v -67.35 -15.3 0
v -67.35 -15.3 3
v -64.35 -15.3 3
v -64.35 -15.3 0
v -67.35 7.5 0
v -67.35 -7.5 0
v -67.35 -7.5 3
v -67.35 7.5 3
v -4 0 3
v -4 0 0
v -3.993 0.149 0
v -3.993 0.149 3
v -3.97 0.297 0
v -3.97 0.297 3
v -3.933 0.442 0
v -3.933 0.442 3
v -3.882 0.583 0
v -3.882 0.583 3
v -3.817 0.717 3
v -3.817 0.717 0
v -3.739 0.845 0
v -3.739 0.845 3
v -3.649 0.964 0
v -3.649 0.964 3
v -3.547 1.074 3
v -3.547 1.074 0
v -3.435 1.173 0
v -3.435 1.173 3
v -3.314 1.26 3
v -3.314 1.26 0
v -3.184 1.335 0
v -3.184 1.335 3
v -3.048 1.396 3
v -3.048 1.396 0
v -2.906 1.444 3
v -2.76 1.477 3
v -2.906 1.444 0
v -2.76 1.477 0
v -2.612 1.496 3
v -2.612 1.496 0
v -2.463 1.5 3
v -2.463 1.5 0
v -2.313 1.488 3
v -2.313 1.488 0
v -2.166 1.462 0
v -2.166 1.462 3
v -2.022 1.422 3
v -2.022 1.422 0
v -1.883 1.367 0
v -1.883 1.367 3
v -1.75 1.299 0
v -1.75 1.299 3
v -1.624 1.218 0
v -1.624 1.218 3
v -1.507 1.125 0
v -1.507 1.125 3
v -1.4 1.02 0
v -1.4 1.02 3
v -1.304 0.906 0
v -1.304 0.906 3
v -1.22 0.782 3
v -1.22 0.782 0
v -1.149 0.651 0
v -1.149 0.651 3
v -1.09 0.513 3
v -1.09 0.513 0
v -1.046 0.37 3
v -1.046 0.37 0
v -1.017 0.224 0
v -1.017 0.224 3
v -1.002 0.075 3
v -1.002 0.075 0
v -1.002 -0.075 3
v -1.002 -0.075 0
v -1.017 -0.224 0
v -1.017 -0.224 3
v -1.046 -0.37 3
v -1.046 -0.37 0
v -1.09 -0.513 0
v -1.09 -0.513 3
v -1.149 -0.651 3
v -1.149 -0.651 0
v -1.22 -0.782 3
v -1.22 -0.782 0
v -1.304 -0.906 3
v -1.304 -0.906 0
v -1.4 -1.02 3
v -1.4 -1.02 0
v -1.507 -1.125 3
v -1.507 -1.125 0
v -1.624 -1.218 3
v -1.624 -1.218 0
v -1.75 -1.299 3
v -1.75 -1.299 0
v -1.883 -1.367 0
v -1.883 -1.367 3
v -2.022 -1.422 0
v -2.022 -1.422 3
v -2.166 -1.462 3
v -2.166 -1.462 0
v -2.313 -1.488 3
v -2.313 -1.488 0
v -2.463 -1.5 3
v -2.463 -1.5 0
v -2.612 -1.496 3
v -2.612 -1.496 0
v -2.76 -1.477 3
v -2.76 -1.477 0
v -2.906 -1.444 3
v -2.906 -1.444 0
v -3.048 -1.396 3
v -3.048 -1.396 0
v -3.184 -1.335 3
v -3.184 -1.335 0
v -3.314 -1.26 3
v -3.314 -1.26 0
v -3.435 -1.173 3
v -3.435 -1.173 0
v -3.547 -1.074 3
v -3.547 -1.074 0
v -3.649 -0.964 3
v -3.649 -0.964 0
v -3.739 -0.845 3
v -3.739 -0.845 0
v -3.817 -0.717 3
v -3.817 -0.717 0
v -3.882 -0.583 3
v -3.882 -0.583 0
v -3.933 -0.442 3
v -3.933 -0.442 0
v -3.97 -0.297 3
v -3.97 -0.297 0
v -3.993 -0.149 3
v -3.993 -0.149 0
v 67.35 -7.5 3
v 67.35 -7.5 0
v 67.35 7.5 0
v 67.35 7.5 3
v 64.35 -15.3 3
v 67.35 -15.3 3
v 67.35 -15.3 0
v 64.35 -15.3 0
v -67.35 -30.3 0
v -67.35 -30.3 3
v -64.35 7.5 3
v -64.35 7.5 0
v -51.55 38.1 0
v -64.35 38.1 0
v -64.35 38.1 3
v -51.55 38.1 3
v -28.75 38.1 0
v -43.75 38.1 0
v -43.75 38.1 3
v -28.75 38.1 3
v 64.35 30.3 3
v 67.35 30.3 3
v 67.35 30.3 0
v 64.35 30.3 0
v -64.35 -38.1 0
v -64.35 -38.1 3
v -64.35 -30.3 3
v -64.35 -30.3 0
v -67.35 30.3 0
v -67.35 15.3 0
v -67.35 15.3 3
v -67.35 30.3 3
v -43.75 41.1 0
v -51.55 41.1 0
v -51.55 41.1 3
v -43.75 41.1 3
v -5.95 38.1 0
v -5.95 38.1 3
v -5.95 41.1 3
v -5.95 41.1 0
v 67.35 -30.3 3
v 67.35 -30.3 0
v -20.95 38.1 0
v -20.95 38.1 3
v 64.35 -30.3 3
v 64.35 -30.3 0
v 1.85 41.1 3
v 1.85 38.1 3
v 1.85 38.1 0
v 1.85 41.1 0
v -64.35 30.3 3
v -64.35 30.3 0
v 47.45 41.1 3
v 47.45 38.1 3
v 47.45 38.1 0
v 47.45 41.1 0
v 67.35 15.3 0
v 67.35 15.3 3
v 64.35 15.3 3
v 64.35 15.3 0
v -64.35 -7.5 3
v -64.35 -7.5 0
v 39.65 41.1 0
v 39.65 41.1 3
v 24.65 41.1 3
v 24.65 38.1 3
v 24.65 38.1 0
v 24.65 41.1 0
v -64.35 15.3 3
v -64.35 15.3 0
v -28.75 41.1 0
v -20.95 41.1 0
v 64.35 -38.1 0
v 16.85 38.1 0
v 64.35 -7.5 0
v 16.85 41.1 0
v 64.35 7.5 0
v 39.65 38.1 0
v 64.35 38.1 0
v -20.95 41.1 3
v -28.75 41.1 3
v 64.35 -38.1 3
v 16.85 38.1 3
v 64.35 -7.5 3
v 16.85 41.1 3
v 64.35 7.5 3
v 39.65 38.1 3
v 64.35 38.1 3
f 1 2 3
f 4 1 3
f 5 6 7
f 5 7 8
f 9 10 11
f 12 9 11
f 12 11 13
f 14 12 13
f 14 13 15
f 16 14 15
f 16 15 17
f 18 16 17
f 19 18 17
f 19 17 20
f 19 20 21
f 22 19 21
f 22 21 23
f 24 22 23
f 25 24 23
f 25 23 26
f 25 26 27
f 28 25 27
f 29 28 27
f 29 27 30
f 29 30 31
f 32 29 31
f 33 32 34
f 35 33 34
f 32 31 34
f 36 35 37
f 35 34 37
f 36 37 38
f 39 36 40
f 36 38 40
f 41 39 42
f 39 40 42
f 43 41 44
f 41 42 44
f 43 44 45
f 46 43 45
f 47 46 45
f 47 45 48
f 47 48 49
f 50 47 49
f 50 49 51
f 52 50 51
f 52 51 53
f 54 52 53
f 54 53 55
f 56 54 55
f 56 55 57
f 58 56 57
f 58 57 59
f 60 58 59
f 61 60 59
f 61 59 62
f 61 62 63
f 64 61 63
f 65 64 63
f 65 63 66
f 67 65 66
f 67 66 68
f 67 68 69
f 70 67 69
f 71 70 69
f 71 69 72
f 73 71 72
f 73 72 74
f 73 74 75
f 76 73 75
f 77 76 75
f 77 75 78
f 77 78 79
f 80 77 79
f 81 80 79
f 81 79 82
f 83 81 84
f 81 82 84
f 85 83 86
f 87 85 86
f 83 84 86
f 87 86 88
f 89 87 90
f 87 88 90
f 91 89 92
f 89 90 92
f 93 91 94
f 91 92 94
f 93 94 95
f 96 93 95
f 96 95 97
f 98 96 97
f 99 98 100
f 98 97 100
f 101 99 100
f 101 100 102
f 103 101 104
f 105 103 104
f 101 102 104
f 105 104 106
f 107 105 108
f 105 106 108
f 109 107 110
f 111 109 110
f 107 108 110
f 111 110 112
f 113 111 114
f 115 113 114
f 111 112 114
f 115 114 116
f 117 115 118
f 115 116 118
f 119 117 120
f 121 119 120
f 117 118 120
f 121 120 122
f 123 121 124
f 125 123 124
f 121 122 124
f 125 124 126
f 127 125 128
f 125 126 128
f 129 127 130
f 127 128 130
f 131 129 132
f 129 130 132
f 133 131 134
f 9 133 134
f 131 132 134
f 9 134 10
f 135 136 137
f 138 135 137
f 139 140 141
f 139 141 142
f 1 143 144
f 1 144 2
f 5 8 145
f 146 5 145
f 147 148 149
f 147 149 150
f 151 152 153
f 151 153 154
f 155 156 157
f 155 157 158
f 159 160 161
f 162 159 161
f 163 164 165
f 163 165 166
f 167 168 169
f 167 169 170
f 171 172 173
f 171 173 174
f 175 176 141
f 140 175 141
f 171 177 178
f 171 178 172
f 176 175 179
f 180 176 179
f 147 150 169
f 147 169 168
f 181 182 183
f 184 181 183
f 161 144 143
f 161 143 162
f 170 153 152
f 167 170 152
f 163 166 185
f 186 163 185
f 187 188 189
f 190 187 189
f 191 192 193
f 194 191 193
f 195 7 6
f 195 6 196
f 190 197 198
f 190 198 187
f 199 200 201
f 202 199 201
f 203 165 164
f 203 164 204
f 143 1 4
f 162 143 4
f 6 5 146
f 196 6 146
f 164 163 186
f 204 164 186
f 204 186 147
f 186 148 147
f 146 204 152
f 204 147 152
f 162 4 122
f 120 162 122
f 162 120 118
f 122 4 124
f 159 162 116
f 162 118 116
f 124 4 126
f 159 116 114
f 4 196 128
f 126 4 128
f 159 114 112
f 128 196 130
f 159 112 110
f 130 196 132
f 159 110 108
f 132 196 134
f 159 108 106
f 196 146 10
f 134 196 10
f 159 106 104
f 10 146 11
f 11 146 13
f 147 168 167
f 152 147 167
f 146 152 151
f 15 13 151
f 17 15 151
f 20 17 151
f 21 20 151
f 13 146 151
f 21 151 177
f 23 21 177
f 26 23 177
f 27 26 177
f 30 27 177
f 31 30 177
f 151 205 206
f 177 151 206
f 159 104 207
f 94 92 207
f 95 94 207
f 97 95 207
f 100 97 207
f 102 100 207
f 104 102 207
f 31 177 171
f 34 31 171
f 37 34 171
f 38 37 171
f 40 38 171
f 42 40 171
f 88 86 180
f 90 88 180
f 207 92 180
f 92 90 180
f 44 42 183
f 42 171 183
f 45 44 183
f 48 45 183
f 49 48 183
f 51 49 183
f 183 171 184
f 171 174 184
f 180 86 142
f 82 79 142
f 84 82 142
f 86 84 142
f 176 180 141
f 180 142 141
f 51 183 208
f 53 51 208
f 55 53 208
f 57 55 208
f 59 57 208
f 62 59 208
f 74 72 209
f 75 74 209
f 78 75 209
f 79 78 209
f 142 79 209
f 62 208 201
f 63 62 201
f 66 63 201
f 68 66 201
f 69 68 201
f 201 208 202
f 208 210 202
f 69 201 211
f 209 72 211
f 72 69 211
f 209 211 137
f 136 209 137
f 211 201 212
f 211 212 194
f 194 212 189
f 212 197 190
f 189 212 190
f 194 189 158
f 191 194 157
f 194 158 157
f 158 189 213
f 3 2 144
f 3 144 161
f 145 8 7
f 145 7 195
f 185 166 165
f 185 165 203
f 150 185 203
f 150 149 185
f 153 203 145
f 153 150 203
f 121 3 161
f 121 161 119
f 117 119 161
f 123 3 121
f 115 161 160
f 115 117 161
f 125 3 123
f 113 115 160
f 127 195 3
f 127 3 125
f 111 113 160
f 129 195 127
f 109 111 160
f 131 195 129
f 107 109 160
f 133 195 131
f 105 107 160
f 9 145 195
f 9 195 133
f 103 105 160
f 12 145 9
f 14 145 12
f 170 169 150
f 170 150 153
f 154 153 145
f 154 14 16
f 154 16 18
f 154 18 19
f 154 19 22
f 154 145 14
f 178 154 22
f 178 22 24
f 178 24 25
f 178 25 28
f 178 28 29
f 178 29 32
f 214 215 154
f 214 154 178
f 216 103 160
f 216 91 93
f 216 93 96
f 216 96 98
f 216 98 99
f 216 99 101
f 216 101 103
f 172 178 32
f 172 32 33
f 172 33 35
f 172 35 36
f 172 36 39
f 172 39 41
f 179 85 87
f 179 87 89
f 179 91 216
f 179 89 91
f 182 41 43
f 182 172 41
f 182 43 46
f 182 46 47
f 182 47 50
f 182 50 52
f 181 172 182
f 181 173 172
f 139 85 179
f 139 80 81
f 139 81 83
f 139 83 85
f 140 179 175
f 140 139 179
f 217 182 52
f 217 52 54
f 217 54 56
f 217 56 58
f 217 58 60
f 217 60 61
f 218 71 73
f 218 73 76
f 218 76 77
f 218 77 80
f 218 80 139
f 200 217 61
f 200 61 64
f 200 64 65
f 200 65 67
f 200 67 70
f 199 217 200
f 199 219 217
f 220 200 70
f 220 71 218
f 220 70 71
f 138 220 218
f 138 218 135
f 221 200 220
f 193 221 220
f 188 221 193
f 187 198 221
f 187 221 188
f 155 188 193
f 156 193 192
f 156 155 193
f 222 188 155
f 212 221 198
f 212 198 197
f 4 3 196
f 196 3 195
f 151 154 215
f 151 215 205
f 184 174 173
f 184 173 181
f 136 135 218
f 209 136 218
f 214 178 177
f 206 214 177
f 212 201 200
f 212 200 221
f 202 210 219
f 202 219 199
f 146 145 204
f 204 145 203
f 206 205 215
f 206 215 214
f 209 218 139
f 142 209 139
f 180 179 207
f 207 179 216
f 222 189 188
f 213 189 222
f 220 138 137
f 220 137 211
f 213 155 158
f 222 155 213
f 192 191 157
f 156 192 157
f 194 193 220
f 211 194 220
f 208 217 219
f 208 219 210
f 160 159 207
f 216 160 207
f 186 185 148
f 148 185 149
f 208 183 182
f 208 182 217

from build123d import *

# Parameters (mm, degrees)
SKETCH1_W                       = 134.7
SKETCH1_H                       = 76.2
BOSS_EXTRUDE1_DEPTH             = 3
SKETCH2_W                       = 3
SKETCH2_H                       = 7.8
CUT_EXTRUDE1_DEPTH              = 78.437926754
LPATTERN1_COUNT                 = 4
LPATTERN1_PITCH                 = 22.8
F_3_0MM_CLEARANCE_DOWEL_HOLE1_D = 3
MIRROR4_COPY_1_SKETCH_W         = 3
MIRROR4_COPY_1_SKETCH_H         = 7.8
MIRROR4_COPY_1_DEPTH            = 78.437926754
MIRROR4_COPY_2_SKETCH_W         = 3
MIRROR4_COPY_2_SKETCH_H         = 7.8
MIRROR4_COPY_2_DEPTH            = 78.437926754
MIRROR4_COPY_3_SKETCH_W         = 3
MIRROR4_COPY_3_SKETCH_H         = 7.8
MIRROR4_COPY_3_DEPTH            = 78.437926754
SKETCH5_W                       = 7.8
SKETCH5_H                       = 3
BOSS_EXTRUDE2_DEPTH             = 3
LPATTERN2_COUNT                 = 5
LPATTERN2_PITCH                 = 22.8


with BuildPart() as part:
    # Sketch1 → Boss-Extrude1 (new body)
    with BuildSketch(Plane.XY):
        Rectangle(SKETCH1_W, SKETCH1_H)
    extrude(amount=BOSS_EXTRUDE1_DEPTH)

    # Sketch2 → Cut-Extrude1 (cut, through all)
    with BuildSketch(Plane.XY.offset(3)):
        with Locations((-65.85, 34.2)):
            Rectangle(SKETCH2_W, SKETCH2_H)
    cut_extrude1 = extrude(amount=-CUT_EXTRUDE1_DEPTH, mode=Mode.SUBTRACT)

    # LPattern1: Cut-Extrude1 ×4
    with Locations(*[(0, -i * LPATTERN1_PITCH, 0) for i in range(1, LPATTERN1_COUNT)]):
        add(cut_extrude1, mode=Mode.SUBTRACT)

    # Ø3.0mm Clearance Dowel Hole1 (through all)
    with Locations(Plane.XY.offset(3)):
        with Locations((-2.5, 0)):
            Hole(F_3_0MM_CLEARANCE_DOWEL_HOLE1_D / 2)

    # Mirror4: Cut-Extrude1 across plane
    add(cut_extrude1.mirror(Plane(origin=(0, 0, 0), x_dir=(0, 0, 1), z_dir=(1, 0, 0))), mode=Mode.SUBTRACT)

    # Mirror4 copy 1 sketch → Mirror4 copy 1 (cut, through all)
    with BuildSketch(Plane(origin=(0, -22.8, 3), x_dir=(-1, 0, 0), z_dir=(0, 0, 1))):
        with Locations((-65.85, -34.2)):
            Rectangle(MIRROR4_COPY_1_SKETCH_W, MIRROR4_COPY_1_SKETCH_H)
    extrude(amount=-MIRROR4_COPY_1_DEPTH, mode=Mode.SUBTRACT)

    # Mirror4 copy 2 sketch → Mirror4 copy 2 (cut, through all)
    with BuildSketch(Plane(origin=(0, -45.6, 3), x_dir=(-1, 0, 0), z_dir=(0, 0, 1))):
        with Locations((-65.85, -34.2)):
            Rectangle(MIRROR4_COPY_2_SKETCH_W, MIRROR4_COPY_2_SKETCH_H)
    extrude(amount=-MIRROR4_COPY_2_DEPTH, mode=Mode.SUBTRACT)

    # Mirror4 copy 3 sketch → Mirror4 copy 3 (cut, through all)
    with BuildSketch(Plane(origin=(0, -68.4, 3), x_dir=(-1, 0, 0), z_dir=(0, 0, 1))):
        with Locations((-65.85, -34.2)):
            Rectangle(MIRROR4_COPY_3_SKETCH_W, MIRROR4_COPY_3_SKETCH_H)
    extrude(amount=-MIRROR4_COPY_3_DEPTH, mode=Mode.SUBTRACT)

    # Sketch5 → Boss-Extrude2 (add)
    with BuildSketch(Plane(origin=(0, 38.1, 0), x_dir=(1, 0, 0), z_dir=(0, 1, 0))):
        with Locations((-47.65, -1.5)):
            Rectangle(SKETCH5_W, SKETCH5_H)
    boss_extrude2 = extrude(amount=BOSS_EXTRUDE2_DEPTH)

    # LPattern2: Boss-Extrude2 ×5
    with Locations(*[(i * LPATTERN2_PITCH, 0, 0) for i in range(1, LPATTERN2_COUNT)]):
        add(boss_extrude2)


solid = part.part
